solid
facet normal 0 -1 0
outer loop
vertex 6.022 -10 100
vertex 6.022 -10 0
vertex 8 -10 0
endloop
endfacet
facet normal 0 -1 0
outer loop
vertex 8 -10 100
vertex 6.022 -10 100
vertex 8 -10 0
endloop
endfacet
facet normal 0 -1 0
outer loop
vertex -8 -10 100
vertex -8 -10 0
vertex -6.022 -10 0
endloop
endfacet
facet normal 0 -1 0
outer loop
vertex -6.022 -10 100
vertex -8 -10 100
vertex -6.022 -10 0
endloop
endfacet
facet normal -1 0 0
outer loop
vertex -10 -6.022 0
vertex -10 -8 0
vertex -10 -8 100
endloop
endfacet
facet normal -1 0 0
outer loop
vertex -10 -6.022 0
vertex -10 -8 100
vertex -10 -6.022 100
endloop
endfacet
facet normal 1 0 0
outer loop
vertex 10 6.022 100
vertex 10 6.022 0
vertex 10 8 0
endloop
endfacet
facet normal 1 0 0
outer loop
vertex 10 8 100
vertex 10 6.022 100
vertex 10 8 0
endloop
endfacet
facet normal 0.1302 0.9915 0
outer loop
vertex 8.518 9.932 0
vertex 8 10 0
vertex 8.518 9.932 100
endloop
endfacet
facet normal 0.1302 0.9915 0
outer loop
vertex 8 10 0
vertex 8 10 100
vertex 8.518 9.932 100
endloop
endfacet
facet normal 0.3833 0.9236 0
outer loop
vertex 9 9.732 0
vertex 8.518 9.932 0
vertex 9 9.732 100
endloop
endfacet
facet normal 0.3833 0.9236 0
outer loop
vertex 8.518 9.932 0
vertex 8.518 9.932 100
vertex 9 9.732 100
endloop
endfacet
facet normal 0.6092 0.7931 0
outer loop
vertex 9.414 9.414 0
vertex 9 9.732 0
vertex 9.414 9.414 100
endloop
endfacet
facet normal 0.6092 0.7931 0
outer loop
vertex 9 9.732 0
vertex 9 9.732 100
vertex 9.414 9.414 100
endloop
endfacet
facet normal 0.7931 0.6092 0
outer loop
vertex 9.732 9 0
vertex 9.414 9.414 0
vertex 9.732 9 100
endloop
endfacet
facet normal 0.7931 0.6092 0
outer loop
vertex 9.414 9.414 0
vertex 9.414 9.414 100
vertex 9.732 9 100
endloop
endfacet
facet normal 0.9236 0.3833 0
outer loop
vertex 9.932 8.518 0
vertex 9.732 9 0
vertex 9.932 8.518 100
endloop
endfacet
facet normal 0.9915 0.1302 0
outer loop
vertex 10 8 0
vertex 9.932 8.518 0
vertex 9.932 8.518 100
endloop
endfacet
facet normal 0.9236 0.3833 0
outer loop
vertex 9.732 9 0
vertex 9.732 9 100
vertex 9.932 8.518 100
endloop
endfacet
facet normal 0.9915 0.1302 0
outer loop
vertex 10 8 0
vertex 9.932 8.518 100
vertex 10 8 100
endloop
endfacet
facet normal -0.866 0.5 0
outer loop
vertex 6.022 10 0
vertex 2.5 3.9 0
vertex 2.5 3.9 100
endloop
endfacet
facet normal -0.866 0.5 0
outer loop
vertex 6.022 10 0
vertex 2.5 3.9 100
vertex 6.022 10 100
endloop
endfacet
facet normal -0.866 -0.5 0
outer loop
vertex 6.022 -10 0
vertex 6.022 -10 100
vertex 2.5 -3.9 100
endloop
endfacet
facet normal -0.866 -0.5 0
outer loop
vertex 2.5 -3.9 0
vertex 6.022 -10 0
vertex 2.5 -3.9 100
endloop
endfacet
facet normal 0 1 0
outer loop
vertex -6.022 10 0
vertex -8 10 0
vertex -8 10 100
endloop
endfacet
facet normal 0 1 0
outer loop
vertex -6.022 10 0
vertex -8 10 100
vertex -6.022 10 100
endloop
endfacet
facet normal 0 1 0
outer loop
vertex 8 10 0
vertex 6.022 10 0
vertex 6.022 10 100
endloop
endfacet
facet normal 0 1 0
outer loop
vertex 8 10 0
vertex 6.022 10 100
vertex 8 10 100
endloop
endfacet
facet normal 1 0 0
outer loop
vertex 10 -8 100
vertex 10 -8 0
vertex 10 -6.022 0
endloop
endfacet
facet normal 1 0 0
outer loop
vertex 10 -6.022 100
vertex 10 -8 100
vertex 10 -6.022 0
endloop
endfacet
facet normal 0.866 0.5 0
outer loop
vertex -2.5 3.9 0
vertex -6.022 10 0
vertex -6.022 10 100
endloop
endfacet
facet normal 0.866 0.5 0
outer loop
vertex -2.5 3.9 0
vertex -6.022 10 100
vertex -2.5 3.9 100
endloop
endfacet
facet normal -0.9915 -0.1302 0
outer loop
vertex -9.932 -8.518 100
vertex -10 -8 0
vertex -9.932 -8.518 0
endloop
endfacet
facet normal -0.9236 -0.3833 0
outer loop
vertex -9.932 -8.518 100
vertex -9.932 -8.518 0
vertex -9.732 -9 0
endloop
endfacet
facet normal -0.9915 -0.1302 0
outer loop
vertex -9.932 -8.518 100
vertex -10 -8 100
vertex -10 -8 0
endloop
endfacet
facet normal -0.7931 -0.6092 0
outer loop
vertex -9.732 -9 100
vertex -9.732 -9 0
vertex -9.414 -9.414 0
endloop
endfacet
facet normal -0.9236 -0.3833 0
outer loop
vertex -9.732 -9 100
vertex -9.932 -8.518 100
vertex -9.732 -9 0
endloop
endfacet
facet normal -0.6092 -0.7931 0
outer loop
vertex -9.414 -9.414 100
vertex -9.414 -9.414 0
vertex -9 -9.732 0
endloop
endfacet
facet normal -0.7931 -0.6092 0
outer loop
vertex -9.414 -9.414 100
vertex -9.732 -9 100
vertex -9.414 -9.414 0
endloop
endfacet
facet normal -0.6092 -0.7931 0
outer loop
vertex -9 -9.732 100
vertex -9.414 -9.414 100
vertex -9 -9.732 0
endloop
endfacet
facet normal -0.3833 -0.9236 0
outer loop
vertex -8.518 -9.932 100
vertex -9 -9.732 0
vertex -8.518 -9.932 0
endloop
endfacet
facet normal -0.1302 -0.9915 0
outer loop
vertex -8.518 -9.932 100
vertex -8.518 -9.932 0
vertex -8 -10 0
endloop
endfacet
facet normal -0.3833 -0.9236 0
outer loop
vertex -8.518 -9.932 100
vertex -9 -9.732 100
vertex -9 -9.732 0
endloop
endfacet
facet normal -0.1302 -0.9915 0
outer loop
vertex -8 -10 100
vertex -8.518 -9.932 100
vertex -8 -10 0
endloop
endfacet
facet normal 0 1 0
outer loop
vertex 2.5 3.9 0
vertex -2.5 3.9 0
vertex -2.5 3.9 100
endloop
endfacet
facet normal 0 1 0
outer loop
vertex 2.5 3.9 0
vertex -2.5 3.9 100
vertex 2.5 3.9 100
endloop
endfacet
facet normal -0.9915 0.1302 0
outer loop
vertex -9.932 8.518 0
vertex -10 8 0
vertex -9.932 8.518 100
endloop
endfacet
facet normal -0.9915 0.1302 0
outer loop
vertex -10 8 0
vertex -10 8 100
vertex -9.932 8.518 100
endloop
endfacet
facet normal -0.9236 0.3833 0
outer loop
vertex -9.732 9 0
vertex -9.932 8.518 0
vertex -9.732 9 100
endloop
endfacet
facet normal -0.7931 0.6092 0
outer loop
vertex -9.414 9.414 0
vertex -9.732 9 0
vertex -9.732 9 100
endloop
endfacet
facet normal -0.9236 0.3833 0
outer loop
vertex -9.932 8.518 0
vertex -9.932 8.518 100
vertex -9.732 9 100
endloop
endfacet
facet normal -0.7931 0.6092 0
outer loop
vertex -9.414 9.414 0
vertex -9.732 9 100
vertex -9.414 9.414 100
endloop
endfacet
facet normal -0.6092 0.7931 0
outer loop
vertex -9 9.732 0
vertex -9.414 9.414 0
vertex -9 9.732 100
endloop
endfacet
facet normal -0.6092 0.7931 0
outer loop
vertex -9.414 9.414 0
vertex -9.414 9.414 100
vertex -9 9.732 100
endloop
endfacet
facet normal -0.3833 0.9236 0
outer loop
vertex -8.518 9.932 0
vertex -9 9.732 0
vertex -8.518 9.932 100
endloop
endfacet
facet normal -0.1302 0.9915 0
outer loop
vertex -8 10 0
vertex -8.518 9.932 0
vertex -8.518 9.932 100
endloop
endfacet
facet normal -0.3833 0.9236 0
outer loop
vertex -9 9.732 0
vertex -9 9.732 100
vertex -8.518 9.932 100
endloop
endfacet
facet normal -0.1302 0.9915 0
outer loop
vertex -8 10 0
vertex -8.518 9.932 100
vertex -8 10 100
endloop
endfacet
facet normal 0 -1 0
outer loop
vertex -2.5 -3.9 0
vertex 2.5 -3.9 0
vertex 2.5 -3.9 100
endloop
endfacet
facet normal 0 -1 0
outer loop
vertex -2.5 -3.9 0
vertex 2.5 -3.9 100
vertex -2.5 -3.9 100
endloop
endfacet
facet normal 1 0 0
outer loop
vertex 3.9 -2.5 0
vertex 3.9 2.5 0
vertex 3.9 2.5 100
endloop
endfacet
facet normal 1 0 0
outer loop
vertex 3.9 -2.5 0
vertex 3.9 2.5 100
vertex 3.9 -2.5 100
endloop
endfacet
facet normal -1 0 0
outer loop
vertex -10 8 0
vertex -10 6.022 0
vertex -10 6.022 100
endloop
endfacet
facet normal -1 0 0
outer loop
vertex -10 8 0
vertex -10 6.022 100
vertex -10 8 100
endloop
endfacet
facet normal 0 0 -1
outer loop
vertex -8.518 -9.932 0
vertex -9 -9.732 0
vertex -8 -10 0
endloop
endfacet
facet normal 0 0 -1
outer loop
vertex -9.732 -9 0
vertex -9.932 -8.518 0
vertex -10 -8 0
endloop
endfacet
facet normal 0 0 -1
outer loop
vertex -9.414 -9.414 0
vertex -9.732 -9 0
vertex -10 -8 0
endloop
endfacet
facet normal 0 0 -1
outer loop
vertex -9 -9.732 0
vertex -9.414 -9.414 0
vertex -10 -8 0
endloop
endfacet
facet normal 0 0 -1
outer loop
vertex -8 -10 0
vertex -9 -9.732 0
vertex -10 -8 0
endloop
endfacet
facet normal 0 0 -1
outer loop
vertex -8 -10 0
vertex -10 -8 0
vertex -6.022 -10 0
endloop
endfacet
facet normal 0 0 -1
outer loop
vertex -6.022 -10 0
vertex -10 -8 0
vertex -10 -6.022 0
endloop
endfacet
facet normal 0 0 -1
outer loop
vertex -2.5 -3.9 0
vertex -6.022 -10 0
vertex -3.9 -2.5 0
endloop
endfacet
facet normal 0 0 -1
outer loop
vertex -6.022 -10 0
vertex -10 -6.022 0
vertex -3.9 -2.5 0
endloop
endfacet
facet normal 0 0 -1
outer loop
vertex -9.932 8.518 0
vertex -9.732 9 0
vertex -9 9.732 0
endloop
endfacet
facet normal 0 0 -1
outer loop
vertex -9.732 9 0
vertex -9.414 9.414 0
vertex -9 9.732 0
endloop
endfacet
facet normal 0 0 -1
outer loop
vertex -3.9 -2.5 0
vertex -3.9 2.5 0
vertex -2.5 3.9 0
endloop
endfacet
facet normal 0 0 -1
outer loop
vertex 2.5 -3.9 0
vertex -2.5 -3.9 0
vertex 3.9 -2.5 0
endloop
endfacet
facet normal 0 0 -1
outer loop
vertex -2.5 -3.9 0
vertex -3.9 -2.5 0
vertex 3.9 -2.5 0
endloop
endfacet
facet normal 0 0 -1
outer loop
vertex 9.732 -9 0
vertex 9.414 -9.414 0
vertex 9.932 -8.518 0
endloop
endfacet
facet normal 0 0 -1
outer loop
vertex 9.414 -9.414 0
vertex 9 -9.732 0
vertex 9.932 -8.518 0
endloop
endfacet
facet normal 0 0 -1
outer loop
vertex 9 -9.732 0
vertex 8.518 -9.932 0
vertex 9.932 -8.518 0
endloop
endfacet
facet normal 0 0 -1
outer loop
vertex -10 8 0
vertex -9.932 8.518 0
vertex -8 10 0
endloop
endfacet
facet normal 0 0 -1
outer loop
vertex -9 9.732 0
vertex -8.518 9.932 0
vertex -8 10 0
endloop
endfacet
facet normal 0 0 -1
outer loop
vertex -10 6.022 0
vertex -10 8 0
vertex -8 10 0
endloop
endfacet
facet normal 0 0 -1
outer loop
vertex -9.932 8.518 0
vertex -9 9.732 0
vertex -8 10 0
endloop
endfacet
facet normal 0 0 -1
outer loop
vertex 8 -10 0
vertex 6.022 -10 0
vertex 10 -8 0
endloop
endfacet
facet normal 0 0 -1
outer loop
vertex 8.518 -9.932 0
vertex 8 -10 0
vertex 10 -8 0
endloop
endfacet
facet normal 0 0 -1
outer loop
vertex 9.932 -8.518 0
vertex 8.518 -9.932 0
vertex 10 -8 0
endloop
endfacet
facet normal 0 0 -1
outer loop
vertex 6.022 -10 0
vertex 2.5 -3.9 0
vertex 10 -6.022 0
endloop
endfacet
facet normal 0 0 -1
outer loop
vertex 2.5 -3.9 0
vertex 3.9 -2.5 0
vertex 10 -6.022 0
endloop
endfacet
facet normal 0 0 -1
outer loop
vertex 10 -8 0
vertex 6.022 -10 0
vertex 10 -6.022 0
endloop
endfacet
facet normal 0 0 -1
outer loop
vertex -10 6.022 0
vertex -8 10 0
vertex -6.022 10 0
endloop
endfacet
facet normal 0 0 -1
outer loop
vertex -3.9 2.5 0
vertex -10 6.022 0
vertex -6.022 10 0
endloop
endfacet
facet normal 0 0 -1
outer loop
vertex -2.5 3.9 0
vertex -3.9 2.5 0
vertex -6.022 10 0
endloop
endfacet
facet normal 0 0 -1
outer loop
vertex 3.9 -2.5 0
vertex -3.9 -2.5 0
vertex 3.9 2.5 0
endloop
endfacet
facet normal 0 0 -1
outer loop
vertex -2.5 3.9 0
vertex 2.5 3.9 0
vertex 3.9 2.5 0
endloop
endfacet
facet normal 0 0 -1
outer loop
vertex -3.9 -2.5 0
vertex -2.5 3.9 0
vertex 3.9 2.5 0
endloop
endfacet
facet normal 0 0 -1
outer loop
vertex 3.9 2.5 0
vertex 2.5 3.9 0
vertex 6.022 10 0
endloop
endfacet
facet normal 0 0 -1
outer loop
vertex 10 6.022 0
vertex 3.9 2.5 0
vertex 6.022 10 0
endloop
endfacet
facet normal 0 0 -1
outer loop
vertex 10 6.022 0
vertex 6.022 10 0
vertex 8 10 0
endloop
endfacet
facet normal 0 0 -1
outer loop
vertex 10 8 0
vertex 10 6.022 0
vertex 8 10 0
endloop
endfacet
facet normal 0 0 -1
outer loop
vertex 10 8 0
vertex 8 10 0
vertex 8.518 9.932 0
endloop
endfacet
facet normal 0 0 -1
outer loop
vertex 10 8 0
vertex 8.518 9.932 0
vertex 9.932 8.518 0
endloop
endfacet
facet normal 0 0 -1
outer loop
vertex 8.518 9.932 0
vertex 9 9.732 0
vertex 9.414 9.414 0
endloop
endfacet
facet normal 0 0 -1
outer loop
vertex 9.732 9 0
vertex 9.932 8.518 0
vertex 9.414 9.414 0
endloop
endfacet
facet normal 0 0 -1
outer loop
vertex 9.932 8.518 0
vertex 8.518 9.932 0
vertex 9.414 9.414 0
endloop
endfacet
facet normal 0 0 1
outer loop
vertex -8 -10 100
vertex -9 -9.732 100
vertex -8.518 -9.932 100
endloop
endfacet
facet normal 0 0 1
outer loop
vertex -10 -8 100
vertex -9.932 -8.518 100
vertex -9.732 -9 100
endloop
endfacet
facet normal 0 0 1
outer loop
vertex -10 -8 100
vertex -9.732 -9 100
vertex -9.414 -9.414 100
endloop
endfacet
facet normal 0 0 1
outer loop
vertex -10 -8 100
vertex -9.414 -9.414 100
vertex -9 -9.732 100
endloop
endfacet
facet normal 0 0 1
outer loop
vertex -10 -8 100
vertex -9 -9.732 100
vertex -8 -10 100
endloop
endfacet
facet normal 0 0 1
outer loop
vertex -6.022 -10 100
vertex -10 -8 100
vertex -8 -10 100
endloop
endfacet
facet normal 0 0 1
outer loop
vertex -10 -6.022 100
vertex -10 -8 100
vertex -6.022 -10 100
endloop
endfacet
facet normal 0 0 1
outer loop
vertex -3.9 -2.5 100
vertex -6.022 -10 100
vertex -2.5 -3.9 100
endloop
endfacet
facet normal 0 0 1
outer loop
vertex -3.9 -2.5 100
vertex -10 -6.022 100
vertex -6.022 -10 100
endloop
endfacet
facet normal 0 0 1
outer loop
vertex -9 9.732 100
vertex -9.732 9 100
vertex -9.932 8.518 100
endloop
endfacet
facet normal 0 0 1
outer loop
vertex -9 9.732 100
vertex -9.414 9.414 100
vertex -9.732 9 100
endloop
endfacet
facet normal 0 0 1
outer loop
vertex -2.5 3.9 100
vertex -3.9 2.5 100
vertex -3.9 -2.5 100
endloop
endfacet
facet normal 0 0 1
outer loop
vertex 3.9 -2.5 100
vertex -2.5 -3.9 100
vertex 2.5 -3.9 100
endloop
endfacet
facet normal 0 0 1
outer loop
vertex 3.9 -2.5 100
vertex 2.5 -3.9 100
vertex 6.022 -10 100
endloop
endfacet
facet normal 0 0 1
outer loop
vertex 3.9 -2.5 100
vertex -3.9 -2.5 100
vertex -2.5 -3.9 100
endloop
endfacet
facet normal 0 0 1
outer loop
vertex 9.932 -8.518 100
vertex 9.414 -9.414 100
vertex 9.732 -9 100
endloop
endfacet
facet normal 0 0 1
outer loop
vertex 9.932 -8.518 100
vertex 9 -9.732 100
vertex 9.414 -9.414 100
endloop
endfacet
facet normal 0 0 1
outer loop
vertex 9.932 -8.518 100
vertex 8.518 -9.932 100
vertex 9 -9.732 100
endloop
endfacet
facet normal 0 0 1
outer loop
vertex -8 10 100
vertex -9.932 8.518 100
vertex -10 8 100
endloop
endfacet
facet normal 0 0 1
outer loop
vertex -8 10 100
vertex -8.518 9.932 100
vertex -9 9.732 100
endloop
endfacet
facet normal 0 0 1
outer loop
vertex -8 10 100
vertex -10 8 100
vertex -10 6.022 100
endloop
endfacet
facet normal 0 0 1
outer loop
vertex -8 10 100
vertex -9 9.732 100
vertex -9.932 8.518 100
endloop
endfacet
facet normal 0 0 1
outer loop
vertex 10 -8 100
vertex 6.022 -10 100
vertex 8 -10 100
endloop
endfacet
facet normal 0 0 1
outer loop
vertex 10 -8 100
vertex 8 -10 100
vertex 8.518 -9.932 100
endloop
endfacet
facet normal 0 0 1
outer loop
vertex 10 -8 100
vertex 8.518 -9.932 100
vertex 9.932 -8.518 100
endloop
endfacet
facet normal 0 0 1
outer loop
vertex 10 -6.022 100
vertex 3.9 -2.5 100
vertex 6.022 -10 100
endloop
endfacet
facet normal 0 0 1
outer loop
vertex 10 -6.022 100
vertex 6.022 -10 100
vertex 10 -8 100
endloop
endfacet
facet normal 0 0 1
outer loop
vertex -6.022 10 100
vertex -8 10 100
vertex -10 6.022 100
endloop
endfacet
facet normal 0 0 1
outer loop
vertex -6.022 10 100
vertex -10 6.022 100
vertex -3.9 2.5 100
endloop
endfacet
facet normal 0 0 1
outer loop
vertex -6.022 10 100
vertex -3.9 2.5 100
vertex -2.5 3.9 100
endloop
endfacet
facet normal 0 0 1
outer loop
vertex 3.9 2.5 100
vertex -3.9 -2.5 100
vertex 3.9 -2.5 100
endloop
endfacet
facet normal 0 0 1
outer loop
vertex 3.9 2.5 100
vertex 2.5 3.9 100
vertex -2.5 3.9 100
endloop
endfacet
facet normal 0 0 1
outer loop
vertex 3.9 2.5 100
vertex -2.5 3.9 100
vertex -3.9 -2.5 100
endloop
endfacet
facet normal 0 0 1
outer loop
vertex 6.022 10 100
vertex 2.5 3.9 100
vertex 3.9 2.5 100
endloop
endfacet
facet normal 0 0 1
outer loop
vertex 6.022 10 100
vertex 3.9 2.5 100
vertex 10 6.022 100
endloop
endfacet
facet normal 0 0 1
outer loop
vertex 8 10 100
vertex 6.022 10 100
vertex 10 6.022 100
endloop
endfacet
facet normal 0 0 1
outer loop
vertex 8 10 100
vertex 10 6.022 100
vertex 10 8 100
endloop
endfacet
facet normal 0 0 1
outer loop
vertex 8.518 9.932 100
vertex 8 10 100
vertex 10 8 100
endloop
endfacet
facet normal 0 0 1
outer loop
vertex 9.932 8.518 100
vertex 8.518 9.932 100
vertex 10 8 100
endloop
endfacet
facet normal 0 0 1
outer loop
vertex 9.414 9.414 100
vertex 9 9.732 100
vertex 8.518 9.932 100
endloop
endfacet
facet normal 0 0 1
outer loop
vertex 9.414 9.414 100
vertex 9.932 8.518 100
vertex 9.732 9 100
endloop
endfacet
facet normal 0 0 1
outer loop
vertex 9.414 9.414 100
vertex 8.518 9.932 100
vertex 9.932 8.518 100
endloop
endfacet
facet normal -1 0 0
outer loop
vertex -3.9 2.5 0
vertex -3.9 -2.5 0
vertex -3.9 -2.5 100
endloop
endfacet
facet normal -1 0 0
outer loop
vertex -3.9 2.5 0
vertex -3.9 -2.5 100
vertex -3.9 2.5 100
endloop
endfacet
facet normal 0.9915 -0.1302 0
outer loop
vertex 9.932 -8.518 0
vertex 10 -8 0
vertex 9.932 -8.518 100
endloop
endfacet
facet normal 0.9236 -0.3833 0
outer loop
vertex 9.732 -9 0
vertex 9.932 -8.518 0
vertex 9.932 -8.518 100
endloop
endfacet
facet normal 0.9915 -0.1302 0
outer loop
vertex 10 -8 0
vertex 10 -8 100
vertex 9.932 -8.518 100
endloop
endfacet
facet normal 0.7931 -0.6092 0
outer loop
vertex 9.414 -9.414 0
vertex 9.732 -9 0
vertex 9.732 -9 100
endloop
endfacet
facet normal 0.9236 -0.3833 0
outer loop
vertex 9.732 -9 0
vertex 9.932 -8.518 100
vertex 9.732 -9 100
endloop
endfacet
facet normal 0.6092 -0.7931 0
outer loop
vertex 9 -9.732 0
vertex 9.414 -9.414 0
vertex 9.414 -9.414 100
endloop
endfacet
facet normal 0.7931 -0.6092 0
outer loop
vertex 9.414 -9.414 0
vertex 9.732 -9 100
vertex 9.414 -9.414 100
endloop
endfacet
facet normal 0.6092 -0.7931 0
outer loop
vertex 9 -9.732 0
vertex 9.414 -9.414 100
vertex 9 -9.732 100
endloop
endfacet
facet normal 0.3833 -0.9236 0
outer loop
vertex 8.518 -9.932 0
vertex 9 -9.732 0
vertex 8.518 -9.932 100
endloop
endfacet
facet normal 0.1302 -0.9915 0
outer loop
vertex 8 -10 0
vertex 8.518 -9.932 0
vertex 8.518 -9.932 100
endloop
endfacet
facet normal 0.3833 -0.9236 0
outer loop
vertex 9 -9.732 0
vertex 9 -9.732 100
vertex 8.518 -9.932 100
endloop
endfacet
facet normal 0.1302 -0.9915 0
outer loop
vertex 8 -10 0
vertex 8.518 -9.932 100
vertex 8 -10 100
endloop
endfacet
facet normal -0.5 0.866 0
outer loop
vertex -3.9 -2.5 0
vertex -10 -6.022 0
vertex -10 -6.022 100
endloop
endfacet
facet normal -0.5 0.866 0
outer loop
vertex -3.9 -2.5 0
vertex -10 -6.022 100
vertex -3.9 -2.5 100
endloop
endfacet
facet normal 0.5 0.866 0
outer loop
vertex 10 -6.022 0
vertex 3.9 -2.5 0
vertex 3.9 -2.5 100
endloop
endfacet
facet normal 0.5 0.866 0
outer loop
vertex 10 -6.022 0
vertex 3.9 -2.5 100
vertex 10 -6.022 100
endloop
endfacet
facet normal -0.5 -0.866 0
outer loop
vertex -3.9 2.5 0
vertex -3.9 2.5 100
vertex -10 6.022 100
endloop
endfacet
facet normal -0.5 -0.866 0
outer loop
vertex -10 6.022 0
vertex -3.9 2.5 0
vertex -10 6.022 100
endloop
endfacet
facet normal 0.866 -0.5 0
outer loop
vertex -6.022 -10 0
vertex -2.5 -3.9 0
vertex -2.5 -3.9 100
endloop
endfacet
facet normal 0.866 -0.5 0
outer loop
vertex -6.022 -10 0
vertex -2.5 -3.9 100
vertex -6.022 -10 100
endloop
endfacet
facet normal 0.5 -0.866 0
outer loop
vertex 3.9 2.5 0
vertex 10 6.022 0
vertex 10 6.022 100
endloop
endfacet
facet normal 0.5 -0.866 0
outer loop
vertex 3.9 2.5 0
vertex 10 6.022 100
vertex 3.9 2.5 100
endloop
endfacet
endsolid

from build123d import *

# Parameters (mm, degrees)
SKETCH1_W           = 20
SKETCH1_H           = 20
BOSS_EXTRUDE1_DEPTH = 100
CUT_EXTRUDE1_DEPTH  = 101.995049384
CIRPATTERN1_COUNT   = 4
FILLET1_R           = 2


with BuildPart() as part:
    # Sketch1 → Boss-Extrude1 (new body)
    with BuildSketch(Plane.XY):
        Rectangle(SKETCH1_W, SKETCH1_H)
    extrude(amount=BOSS_EXTRUDE1_DEPTH)

    # Sketch2 → Cut-Extrude1 (cut, through all)
    with BuildSketch(Plane.XY):
        Polygon((6.021836642, 10), (-6.021836642, 10), (-2.5, 3.9), (2.5, 3.9), align=None)
    cut_extrude1 = extrude(amount=CUT_EXTRUDE1_DEPTH, mode=Mode.SUBTRACT)

    # CirPattern1: Cut-Extrude1 ×4 about axis
    cirpattern1_axis = Axis((0, 0, -5), (0, 0, 1))
    for i in range(1, CIRPATTERN1_COUNT):
        add(cut_extrude1.rotate(cirpattern1_axis, i * 360 / CIRPATTERN1_COUNT), mode=Mode.SUBTRACT)

    # Fillet1
    fillet1_edges = [part.edges().sort_by_distance(p)[0] for p in [
        (-10, -10, 50),
        (10, -10, 50),
        (10, 10, 50),
        (-10, 10, 50),
    ]]
    fillet(fillet1_edges, radius=FILLET1_R)


solid = part.part
